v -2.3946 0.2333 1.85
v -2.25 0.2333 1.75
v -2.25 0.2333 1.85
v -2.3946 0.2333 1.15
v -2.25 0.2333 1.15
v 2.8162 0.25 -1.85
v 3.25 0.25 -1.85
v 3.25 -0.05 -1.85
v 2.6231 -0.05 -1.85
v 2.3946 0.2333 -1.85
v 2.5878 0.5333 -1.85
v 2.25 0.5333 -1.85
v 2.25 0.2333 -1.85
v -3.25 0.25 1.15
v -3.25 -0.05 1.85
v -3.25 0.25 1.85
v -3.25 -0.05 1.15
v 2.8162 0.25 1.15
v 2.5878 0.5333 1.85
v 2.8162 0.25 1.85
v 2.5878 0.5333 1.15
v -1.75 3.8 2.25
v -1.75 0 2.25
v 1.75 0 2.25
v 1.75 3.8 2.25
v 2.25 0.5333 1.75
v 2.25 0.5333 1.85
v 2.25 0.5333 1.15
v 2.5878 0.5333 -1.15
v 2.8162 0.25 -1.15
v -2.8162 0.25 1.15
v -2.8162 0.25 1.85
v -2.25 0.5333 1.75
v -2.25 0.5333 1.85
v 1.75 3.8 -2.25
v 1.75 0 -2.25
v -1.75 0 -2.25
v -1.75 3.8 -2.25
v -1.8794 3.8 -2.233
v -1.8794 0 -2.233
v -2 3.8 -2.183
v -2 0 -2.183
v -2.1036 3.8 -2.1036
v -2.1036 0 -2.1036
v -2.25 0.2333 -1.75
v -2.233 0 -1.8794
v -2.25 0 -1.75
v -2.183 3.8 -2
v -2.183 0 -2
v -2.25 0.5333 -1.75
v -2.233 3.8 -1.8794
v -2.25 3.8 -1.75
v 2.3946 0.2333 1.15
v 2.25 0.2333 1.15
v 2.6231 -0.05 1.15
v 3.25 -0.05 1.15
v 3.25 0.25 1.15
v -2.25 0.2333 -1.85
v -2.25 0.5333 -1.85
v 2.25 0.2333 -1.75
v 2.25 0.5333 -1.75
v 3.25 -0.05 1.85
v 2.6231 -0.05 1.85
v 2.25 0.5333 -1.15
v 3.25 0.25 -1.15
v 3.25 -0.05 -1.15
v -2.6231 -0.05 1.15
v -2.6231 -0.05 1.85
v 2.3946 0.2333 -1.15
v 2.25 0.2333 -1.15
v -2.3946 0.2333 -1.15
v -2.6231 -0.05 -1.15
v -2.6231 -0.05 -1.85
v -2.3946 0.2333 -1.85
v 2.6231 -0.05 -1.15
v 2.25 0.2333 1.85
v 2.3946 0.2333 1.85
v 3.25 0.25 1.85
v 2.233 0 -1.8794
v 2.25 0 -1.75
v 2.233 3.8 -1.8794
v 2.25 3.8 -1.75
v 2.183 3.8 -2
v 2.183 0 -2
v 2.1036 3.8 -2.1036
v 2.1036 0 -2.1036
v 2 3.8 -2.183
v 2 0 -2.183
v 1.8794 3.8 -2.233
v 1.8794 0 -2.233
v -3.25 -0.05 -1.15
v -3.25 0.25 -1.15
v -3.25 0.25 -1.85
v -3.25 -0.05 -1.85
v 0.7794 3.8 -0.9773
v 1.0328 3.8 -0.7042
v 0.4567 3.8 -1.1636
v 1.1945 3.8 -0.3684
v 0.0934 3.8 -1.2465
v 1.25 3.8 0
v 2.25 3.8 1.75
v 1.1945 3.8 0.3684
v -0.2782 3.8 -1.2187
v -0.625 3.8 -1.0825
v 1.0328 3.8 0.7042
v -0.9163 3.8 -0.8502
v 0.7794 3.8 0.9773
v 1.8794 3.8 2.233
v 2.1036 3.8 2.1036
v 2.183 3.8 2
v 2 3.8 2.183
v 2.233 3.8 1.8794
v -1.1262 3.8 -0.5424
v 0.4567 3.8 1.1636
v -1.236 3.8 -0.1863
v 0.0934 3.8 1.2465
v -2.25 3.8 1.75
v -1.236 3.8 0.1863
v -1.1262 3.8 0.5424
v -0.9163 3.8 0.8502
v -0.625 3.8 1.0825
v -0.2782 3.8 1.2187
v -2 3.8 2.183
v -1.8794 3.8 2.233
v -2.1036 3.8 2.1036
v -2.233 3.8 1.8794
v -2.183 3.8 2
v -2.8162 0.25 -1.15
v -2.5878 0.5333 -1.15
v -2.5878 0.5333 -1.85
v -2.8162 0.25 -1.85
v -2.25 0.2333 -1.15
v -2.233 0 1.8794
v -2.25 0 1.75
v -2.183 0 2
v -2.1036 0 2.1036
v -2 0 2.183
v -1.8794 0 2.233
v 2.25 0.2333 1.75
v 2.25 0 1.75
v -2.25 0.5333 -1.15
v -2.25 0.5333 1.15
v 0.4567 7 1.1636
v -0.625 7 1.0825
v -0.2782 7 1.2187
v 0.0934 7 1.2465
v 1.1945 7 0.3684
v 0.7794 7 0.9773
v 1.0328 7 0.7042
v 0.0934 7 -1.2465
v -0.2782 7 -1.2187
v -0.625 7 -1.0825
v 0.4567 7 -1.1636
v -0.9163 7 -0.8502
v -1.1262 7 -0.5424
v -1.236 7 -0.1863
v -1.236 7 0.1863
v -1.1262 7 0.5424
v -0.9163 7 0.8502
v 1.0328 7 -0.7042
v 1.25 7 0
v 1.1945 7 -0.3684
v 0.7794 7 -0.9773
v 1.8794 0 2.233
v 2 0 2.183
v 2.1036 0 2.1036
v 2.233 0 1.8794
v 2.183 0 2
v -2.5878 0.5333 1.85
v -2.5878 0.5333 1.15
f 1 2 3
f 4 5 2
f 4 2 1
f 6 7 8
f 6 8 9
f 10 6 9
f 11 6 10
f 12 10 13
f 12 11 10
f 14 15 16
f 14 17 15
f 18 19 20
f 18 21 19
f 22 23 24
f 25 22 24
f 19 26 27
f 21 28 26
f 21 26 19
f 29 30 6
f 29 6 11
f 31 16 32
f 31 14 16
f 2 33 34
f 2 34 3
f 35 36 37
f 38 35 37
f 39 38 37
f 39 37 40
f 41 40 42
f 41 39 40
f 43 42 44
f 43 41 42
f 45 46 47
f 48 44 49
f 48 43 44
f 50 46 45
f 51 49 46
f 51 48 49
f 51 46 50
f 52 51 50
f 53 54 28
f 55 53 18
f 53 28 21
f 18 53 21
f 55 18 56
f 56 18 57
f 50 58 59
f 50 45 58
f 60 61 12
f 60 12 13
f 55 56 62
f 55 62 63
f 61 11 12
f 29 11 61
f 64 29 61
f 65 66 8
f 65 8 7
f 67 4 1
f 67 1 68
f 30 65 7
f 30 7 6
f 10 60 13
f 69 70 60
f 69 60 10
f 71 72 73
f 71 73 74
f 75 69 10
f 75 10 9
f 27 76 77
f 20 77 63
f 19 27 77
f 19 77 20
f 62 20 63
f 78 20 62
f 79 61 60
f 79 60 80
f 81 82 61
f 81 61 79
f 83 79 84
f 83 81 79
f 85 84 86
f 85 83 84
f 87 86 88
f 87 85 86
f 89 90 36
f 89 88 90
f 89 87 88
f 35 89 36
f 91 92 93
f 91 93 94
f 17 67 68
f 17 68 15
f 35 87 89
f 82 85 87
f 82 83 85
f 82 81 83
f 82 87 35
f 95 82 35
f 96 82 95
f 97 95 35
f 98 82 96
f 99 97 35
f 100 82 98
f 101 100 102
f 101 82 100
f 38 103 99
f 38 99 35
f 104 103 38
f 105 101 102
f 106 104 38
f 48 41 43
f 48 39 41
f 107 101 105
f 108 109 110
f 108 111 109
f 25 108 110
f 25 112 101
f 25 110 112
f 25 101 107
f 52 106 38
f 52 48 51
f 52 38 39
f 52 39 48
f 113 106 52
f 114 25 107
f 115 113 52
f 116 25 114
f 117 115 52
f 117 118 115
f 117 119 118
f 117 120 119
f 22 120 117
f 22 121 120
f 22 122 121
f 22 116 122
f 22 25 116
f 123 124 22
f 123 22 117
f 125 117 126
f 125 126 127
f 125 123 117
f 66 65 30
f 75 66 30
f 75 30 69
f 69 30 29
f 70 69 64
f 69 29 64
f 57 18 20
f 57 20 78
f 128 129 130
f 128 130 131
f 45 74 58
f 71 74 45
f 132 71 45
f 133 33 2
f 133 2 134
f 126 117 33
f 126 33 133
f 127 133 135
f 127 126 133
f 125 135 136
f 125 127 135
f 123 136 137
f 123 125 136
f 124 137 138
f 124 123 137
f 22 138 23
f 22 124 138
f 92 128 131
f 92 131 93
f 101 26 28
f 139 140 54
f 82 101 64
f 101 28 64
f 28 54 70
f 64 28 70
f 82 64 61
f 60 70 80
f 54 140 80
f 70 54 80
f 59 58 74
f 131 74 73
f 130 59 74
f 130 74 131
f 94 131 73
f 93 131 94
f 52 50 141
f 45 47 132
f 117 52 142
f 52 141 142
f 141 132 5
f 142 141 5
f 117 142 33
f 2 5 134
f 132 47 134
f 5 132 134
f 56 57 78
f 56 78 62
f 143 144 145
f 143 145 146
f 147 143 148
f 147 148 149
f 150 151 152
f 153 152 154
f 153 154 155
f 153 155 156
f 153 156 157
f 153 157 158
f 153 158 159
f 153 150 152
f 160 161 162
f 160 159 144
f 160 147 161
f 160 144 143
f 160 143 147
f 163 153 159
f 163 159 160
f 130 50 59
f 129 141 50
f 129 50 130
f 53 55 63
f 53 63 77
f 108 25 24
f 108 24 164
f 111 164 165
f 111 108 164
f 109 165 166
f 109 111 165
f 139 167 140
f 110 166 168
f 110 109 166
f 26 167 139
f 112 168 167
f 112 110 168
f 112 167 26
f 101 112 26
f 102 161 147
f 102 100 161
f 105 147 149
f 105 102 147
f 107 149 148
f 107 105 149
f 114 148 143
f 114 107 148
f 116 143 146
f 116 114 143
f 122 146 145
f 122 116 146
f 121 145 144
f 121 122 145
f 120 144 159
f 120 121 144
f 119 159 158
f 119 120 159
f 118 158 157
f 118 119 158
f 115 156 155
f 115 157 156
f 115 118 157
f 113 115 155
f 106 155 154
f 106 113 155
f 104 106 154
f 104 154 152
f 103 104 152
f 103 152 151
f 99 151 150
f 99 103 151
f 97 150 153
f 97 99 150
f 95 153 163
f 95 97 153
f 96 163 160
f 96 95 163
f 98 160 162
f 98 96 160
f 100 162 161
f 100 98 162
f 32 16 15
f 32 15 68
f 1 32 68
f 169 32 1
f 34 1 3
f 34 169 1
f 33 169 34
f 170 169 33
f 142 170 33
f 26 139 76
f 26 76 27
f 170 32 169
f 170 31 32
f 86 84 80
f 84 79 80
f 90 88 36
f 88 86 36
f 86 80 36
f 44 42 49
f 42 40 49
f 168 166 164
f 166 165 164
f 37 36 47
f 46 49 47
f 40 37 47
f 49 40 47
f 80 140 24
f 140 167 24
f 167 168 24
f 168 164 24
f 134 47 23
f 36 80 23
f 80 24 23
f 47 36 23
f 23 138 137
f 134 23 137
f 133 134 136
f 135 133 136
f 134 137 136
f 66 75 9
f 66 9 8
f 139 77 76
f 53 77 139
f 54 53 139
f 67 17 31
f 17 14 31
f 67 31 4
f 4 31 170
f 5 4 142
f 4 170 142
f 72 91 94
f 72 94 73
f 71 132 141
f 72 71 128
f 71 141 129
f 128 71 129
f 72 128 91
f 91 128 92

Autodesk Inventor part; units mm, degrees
ref_plane "YZ Plane" through (0, 0, 0) normal (1, 0, 0) x (0, 1, 0)
ref_plane "XZ Plane" through (0, 0, 0) normal (0, 1, 0) x (-1, 0, 0)
sketch "Sketch1" plane through (0, 0, 0) normal (0, 1, 0) x (-1, 0, 0)
  line L0 (2.25, 2.25) -> (-2.25, 2.25)
  line L1 (-2.25, 2.25) -> (-2.25, -2.25)
  line L2 (-2.25, -2.25) -> (2.25, -2.25)
  line L3 (2.25, -2.25) -> (2.25, 2.25)
  point P0 (0, 0)
  dimension "d0" = 4.5
  dimension "d1" = 2.25
  dimension "d2" = 4.5
  dimension "d3" = 2.25
extrude "Extrusion1" add sketch "Sketch1" along normal blind 3.8
fillet "Fillet1" radius 0.5 4 edges at (2.25, 1.9, 2.25) (2.25, 1.9, -2.25) (-2.25, 1.9, 2.25) (-2.25, 1.9, -2.25)
sketch "Sketch2" plane through (0, 3.8, 0) normal (0, 1, 0) x (1, 0, 0)
  circle A0 centre (0, 0) radius 1.25
  dimension "d7" = 2.5
extrude "Extrusion2" add sketch "Sketch2" along normal blind 3.2
ref_plane "Work Plane1" through (0, 0, 1.5) normal (0, 0, 1) x (1, 0, 0)
sketch "Sketch3" plane through (0, 0, 1.5) normal (0, 0, 1) x (1, 0, 0)
  line L0 (-2.25, 3.8) -> (-2.25, 0) projected
  line L1 (-2.25, 0.5333) -> (-2.25, 0.2333)
  line L2 (-2.25, 0.2333) -> (-2.3946, 0.2333)
  line L3 (-2.3946, 0.2333) -> (-2.6231, -0.05)
  line L4 (-2.6231, -0.05) -> (-3.25, -0.05)
  line L5 (-3.25, -0.05) -> (-3.25, 0.25)
  line L6 (-3.25, 0.25) -> (-2.8162, 0.25)
  line L7 (-2.8162, 0.25) -> (-2.5878, 0.5333)
  line L8 (-2.5878, 0.5333) -> (-2.25, 0.5333)
  line L9 (-1.75, 0) -> (-2.25, 0) projected
  point P0 (0, 0)
  dimension "d11" = 0.3
  dimension "d12" = 0.3
  dimension "d13" = 0.05
  dimension "d14" = 1
extrude "Extrusion3" add sketch "Sketch3" along normal mid plane 0.7
mirror "Mirror1" about plane through (0, 0, 0) normal (0, 0, 1) of "Extrusion3"
mirror "Mirror2" about plane through (0, 0, 0) normal (1, 0, 0) of "Extrusion3", "Mirror1"
properties part number "TL3305_Tactile"
